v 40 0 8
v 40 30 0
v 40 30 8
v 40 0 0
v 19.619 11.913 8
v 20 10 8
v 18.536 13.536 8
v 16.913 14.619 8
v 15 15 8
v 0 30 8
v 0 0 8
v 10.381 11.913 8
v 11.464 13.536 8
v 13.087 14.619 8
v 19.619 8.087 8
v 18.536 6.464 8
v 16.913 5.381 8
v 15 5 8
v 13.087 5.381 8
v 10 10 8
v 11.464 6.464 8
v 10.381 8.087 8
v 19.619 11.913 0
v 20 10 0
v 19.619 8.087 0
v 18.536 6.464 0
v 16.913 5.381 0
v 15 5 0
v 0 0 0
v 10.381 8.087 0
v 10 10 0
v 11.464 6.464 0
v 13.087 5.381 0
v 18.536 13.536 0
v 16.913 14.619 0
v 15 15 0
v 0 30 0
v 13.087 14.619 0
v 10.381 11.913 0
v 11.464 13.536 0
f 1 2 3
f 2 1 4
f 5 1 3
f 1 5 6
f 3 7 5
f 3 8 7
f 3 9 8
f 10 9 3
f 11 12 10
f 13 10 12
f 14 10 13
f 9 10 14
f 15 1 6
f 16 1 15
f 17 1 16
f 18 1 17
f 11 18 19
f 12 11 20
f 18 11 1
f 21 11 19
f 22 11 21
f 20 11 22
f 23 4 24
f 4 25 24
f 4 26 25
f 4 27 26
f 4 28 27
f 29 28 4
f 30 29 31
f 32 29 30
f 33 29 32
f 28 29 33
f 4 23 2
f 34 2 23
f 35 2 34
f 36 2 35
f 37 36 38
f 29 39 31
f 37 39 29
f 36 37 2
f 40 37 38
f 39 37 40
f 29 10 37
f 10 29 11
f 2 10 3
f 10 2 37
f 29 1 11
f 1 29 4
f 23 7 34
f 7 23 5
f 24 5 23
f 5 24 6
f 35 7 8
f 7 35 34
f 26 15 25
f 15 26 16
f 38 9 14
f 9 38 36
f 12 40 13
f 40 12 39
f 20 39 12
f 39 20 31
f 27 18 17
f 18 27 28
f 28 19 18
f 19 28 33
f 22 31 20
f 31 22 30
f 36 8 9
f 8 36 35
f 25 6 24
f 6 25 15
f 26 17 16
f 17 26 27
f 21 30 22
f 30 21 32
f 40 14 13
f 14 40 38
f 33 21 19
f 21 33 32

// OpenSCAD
module rectangular_plate(length, width, thickness) {
    difference() {
        cube([length, width, thickness]);
        translate([length/2 - 5, width/2 - 5, 0])
            cylinder(h=thickness, r=5);
    }
}

rectangular_plate(40, 30, 8);
